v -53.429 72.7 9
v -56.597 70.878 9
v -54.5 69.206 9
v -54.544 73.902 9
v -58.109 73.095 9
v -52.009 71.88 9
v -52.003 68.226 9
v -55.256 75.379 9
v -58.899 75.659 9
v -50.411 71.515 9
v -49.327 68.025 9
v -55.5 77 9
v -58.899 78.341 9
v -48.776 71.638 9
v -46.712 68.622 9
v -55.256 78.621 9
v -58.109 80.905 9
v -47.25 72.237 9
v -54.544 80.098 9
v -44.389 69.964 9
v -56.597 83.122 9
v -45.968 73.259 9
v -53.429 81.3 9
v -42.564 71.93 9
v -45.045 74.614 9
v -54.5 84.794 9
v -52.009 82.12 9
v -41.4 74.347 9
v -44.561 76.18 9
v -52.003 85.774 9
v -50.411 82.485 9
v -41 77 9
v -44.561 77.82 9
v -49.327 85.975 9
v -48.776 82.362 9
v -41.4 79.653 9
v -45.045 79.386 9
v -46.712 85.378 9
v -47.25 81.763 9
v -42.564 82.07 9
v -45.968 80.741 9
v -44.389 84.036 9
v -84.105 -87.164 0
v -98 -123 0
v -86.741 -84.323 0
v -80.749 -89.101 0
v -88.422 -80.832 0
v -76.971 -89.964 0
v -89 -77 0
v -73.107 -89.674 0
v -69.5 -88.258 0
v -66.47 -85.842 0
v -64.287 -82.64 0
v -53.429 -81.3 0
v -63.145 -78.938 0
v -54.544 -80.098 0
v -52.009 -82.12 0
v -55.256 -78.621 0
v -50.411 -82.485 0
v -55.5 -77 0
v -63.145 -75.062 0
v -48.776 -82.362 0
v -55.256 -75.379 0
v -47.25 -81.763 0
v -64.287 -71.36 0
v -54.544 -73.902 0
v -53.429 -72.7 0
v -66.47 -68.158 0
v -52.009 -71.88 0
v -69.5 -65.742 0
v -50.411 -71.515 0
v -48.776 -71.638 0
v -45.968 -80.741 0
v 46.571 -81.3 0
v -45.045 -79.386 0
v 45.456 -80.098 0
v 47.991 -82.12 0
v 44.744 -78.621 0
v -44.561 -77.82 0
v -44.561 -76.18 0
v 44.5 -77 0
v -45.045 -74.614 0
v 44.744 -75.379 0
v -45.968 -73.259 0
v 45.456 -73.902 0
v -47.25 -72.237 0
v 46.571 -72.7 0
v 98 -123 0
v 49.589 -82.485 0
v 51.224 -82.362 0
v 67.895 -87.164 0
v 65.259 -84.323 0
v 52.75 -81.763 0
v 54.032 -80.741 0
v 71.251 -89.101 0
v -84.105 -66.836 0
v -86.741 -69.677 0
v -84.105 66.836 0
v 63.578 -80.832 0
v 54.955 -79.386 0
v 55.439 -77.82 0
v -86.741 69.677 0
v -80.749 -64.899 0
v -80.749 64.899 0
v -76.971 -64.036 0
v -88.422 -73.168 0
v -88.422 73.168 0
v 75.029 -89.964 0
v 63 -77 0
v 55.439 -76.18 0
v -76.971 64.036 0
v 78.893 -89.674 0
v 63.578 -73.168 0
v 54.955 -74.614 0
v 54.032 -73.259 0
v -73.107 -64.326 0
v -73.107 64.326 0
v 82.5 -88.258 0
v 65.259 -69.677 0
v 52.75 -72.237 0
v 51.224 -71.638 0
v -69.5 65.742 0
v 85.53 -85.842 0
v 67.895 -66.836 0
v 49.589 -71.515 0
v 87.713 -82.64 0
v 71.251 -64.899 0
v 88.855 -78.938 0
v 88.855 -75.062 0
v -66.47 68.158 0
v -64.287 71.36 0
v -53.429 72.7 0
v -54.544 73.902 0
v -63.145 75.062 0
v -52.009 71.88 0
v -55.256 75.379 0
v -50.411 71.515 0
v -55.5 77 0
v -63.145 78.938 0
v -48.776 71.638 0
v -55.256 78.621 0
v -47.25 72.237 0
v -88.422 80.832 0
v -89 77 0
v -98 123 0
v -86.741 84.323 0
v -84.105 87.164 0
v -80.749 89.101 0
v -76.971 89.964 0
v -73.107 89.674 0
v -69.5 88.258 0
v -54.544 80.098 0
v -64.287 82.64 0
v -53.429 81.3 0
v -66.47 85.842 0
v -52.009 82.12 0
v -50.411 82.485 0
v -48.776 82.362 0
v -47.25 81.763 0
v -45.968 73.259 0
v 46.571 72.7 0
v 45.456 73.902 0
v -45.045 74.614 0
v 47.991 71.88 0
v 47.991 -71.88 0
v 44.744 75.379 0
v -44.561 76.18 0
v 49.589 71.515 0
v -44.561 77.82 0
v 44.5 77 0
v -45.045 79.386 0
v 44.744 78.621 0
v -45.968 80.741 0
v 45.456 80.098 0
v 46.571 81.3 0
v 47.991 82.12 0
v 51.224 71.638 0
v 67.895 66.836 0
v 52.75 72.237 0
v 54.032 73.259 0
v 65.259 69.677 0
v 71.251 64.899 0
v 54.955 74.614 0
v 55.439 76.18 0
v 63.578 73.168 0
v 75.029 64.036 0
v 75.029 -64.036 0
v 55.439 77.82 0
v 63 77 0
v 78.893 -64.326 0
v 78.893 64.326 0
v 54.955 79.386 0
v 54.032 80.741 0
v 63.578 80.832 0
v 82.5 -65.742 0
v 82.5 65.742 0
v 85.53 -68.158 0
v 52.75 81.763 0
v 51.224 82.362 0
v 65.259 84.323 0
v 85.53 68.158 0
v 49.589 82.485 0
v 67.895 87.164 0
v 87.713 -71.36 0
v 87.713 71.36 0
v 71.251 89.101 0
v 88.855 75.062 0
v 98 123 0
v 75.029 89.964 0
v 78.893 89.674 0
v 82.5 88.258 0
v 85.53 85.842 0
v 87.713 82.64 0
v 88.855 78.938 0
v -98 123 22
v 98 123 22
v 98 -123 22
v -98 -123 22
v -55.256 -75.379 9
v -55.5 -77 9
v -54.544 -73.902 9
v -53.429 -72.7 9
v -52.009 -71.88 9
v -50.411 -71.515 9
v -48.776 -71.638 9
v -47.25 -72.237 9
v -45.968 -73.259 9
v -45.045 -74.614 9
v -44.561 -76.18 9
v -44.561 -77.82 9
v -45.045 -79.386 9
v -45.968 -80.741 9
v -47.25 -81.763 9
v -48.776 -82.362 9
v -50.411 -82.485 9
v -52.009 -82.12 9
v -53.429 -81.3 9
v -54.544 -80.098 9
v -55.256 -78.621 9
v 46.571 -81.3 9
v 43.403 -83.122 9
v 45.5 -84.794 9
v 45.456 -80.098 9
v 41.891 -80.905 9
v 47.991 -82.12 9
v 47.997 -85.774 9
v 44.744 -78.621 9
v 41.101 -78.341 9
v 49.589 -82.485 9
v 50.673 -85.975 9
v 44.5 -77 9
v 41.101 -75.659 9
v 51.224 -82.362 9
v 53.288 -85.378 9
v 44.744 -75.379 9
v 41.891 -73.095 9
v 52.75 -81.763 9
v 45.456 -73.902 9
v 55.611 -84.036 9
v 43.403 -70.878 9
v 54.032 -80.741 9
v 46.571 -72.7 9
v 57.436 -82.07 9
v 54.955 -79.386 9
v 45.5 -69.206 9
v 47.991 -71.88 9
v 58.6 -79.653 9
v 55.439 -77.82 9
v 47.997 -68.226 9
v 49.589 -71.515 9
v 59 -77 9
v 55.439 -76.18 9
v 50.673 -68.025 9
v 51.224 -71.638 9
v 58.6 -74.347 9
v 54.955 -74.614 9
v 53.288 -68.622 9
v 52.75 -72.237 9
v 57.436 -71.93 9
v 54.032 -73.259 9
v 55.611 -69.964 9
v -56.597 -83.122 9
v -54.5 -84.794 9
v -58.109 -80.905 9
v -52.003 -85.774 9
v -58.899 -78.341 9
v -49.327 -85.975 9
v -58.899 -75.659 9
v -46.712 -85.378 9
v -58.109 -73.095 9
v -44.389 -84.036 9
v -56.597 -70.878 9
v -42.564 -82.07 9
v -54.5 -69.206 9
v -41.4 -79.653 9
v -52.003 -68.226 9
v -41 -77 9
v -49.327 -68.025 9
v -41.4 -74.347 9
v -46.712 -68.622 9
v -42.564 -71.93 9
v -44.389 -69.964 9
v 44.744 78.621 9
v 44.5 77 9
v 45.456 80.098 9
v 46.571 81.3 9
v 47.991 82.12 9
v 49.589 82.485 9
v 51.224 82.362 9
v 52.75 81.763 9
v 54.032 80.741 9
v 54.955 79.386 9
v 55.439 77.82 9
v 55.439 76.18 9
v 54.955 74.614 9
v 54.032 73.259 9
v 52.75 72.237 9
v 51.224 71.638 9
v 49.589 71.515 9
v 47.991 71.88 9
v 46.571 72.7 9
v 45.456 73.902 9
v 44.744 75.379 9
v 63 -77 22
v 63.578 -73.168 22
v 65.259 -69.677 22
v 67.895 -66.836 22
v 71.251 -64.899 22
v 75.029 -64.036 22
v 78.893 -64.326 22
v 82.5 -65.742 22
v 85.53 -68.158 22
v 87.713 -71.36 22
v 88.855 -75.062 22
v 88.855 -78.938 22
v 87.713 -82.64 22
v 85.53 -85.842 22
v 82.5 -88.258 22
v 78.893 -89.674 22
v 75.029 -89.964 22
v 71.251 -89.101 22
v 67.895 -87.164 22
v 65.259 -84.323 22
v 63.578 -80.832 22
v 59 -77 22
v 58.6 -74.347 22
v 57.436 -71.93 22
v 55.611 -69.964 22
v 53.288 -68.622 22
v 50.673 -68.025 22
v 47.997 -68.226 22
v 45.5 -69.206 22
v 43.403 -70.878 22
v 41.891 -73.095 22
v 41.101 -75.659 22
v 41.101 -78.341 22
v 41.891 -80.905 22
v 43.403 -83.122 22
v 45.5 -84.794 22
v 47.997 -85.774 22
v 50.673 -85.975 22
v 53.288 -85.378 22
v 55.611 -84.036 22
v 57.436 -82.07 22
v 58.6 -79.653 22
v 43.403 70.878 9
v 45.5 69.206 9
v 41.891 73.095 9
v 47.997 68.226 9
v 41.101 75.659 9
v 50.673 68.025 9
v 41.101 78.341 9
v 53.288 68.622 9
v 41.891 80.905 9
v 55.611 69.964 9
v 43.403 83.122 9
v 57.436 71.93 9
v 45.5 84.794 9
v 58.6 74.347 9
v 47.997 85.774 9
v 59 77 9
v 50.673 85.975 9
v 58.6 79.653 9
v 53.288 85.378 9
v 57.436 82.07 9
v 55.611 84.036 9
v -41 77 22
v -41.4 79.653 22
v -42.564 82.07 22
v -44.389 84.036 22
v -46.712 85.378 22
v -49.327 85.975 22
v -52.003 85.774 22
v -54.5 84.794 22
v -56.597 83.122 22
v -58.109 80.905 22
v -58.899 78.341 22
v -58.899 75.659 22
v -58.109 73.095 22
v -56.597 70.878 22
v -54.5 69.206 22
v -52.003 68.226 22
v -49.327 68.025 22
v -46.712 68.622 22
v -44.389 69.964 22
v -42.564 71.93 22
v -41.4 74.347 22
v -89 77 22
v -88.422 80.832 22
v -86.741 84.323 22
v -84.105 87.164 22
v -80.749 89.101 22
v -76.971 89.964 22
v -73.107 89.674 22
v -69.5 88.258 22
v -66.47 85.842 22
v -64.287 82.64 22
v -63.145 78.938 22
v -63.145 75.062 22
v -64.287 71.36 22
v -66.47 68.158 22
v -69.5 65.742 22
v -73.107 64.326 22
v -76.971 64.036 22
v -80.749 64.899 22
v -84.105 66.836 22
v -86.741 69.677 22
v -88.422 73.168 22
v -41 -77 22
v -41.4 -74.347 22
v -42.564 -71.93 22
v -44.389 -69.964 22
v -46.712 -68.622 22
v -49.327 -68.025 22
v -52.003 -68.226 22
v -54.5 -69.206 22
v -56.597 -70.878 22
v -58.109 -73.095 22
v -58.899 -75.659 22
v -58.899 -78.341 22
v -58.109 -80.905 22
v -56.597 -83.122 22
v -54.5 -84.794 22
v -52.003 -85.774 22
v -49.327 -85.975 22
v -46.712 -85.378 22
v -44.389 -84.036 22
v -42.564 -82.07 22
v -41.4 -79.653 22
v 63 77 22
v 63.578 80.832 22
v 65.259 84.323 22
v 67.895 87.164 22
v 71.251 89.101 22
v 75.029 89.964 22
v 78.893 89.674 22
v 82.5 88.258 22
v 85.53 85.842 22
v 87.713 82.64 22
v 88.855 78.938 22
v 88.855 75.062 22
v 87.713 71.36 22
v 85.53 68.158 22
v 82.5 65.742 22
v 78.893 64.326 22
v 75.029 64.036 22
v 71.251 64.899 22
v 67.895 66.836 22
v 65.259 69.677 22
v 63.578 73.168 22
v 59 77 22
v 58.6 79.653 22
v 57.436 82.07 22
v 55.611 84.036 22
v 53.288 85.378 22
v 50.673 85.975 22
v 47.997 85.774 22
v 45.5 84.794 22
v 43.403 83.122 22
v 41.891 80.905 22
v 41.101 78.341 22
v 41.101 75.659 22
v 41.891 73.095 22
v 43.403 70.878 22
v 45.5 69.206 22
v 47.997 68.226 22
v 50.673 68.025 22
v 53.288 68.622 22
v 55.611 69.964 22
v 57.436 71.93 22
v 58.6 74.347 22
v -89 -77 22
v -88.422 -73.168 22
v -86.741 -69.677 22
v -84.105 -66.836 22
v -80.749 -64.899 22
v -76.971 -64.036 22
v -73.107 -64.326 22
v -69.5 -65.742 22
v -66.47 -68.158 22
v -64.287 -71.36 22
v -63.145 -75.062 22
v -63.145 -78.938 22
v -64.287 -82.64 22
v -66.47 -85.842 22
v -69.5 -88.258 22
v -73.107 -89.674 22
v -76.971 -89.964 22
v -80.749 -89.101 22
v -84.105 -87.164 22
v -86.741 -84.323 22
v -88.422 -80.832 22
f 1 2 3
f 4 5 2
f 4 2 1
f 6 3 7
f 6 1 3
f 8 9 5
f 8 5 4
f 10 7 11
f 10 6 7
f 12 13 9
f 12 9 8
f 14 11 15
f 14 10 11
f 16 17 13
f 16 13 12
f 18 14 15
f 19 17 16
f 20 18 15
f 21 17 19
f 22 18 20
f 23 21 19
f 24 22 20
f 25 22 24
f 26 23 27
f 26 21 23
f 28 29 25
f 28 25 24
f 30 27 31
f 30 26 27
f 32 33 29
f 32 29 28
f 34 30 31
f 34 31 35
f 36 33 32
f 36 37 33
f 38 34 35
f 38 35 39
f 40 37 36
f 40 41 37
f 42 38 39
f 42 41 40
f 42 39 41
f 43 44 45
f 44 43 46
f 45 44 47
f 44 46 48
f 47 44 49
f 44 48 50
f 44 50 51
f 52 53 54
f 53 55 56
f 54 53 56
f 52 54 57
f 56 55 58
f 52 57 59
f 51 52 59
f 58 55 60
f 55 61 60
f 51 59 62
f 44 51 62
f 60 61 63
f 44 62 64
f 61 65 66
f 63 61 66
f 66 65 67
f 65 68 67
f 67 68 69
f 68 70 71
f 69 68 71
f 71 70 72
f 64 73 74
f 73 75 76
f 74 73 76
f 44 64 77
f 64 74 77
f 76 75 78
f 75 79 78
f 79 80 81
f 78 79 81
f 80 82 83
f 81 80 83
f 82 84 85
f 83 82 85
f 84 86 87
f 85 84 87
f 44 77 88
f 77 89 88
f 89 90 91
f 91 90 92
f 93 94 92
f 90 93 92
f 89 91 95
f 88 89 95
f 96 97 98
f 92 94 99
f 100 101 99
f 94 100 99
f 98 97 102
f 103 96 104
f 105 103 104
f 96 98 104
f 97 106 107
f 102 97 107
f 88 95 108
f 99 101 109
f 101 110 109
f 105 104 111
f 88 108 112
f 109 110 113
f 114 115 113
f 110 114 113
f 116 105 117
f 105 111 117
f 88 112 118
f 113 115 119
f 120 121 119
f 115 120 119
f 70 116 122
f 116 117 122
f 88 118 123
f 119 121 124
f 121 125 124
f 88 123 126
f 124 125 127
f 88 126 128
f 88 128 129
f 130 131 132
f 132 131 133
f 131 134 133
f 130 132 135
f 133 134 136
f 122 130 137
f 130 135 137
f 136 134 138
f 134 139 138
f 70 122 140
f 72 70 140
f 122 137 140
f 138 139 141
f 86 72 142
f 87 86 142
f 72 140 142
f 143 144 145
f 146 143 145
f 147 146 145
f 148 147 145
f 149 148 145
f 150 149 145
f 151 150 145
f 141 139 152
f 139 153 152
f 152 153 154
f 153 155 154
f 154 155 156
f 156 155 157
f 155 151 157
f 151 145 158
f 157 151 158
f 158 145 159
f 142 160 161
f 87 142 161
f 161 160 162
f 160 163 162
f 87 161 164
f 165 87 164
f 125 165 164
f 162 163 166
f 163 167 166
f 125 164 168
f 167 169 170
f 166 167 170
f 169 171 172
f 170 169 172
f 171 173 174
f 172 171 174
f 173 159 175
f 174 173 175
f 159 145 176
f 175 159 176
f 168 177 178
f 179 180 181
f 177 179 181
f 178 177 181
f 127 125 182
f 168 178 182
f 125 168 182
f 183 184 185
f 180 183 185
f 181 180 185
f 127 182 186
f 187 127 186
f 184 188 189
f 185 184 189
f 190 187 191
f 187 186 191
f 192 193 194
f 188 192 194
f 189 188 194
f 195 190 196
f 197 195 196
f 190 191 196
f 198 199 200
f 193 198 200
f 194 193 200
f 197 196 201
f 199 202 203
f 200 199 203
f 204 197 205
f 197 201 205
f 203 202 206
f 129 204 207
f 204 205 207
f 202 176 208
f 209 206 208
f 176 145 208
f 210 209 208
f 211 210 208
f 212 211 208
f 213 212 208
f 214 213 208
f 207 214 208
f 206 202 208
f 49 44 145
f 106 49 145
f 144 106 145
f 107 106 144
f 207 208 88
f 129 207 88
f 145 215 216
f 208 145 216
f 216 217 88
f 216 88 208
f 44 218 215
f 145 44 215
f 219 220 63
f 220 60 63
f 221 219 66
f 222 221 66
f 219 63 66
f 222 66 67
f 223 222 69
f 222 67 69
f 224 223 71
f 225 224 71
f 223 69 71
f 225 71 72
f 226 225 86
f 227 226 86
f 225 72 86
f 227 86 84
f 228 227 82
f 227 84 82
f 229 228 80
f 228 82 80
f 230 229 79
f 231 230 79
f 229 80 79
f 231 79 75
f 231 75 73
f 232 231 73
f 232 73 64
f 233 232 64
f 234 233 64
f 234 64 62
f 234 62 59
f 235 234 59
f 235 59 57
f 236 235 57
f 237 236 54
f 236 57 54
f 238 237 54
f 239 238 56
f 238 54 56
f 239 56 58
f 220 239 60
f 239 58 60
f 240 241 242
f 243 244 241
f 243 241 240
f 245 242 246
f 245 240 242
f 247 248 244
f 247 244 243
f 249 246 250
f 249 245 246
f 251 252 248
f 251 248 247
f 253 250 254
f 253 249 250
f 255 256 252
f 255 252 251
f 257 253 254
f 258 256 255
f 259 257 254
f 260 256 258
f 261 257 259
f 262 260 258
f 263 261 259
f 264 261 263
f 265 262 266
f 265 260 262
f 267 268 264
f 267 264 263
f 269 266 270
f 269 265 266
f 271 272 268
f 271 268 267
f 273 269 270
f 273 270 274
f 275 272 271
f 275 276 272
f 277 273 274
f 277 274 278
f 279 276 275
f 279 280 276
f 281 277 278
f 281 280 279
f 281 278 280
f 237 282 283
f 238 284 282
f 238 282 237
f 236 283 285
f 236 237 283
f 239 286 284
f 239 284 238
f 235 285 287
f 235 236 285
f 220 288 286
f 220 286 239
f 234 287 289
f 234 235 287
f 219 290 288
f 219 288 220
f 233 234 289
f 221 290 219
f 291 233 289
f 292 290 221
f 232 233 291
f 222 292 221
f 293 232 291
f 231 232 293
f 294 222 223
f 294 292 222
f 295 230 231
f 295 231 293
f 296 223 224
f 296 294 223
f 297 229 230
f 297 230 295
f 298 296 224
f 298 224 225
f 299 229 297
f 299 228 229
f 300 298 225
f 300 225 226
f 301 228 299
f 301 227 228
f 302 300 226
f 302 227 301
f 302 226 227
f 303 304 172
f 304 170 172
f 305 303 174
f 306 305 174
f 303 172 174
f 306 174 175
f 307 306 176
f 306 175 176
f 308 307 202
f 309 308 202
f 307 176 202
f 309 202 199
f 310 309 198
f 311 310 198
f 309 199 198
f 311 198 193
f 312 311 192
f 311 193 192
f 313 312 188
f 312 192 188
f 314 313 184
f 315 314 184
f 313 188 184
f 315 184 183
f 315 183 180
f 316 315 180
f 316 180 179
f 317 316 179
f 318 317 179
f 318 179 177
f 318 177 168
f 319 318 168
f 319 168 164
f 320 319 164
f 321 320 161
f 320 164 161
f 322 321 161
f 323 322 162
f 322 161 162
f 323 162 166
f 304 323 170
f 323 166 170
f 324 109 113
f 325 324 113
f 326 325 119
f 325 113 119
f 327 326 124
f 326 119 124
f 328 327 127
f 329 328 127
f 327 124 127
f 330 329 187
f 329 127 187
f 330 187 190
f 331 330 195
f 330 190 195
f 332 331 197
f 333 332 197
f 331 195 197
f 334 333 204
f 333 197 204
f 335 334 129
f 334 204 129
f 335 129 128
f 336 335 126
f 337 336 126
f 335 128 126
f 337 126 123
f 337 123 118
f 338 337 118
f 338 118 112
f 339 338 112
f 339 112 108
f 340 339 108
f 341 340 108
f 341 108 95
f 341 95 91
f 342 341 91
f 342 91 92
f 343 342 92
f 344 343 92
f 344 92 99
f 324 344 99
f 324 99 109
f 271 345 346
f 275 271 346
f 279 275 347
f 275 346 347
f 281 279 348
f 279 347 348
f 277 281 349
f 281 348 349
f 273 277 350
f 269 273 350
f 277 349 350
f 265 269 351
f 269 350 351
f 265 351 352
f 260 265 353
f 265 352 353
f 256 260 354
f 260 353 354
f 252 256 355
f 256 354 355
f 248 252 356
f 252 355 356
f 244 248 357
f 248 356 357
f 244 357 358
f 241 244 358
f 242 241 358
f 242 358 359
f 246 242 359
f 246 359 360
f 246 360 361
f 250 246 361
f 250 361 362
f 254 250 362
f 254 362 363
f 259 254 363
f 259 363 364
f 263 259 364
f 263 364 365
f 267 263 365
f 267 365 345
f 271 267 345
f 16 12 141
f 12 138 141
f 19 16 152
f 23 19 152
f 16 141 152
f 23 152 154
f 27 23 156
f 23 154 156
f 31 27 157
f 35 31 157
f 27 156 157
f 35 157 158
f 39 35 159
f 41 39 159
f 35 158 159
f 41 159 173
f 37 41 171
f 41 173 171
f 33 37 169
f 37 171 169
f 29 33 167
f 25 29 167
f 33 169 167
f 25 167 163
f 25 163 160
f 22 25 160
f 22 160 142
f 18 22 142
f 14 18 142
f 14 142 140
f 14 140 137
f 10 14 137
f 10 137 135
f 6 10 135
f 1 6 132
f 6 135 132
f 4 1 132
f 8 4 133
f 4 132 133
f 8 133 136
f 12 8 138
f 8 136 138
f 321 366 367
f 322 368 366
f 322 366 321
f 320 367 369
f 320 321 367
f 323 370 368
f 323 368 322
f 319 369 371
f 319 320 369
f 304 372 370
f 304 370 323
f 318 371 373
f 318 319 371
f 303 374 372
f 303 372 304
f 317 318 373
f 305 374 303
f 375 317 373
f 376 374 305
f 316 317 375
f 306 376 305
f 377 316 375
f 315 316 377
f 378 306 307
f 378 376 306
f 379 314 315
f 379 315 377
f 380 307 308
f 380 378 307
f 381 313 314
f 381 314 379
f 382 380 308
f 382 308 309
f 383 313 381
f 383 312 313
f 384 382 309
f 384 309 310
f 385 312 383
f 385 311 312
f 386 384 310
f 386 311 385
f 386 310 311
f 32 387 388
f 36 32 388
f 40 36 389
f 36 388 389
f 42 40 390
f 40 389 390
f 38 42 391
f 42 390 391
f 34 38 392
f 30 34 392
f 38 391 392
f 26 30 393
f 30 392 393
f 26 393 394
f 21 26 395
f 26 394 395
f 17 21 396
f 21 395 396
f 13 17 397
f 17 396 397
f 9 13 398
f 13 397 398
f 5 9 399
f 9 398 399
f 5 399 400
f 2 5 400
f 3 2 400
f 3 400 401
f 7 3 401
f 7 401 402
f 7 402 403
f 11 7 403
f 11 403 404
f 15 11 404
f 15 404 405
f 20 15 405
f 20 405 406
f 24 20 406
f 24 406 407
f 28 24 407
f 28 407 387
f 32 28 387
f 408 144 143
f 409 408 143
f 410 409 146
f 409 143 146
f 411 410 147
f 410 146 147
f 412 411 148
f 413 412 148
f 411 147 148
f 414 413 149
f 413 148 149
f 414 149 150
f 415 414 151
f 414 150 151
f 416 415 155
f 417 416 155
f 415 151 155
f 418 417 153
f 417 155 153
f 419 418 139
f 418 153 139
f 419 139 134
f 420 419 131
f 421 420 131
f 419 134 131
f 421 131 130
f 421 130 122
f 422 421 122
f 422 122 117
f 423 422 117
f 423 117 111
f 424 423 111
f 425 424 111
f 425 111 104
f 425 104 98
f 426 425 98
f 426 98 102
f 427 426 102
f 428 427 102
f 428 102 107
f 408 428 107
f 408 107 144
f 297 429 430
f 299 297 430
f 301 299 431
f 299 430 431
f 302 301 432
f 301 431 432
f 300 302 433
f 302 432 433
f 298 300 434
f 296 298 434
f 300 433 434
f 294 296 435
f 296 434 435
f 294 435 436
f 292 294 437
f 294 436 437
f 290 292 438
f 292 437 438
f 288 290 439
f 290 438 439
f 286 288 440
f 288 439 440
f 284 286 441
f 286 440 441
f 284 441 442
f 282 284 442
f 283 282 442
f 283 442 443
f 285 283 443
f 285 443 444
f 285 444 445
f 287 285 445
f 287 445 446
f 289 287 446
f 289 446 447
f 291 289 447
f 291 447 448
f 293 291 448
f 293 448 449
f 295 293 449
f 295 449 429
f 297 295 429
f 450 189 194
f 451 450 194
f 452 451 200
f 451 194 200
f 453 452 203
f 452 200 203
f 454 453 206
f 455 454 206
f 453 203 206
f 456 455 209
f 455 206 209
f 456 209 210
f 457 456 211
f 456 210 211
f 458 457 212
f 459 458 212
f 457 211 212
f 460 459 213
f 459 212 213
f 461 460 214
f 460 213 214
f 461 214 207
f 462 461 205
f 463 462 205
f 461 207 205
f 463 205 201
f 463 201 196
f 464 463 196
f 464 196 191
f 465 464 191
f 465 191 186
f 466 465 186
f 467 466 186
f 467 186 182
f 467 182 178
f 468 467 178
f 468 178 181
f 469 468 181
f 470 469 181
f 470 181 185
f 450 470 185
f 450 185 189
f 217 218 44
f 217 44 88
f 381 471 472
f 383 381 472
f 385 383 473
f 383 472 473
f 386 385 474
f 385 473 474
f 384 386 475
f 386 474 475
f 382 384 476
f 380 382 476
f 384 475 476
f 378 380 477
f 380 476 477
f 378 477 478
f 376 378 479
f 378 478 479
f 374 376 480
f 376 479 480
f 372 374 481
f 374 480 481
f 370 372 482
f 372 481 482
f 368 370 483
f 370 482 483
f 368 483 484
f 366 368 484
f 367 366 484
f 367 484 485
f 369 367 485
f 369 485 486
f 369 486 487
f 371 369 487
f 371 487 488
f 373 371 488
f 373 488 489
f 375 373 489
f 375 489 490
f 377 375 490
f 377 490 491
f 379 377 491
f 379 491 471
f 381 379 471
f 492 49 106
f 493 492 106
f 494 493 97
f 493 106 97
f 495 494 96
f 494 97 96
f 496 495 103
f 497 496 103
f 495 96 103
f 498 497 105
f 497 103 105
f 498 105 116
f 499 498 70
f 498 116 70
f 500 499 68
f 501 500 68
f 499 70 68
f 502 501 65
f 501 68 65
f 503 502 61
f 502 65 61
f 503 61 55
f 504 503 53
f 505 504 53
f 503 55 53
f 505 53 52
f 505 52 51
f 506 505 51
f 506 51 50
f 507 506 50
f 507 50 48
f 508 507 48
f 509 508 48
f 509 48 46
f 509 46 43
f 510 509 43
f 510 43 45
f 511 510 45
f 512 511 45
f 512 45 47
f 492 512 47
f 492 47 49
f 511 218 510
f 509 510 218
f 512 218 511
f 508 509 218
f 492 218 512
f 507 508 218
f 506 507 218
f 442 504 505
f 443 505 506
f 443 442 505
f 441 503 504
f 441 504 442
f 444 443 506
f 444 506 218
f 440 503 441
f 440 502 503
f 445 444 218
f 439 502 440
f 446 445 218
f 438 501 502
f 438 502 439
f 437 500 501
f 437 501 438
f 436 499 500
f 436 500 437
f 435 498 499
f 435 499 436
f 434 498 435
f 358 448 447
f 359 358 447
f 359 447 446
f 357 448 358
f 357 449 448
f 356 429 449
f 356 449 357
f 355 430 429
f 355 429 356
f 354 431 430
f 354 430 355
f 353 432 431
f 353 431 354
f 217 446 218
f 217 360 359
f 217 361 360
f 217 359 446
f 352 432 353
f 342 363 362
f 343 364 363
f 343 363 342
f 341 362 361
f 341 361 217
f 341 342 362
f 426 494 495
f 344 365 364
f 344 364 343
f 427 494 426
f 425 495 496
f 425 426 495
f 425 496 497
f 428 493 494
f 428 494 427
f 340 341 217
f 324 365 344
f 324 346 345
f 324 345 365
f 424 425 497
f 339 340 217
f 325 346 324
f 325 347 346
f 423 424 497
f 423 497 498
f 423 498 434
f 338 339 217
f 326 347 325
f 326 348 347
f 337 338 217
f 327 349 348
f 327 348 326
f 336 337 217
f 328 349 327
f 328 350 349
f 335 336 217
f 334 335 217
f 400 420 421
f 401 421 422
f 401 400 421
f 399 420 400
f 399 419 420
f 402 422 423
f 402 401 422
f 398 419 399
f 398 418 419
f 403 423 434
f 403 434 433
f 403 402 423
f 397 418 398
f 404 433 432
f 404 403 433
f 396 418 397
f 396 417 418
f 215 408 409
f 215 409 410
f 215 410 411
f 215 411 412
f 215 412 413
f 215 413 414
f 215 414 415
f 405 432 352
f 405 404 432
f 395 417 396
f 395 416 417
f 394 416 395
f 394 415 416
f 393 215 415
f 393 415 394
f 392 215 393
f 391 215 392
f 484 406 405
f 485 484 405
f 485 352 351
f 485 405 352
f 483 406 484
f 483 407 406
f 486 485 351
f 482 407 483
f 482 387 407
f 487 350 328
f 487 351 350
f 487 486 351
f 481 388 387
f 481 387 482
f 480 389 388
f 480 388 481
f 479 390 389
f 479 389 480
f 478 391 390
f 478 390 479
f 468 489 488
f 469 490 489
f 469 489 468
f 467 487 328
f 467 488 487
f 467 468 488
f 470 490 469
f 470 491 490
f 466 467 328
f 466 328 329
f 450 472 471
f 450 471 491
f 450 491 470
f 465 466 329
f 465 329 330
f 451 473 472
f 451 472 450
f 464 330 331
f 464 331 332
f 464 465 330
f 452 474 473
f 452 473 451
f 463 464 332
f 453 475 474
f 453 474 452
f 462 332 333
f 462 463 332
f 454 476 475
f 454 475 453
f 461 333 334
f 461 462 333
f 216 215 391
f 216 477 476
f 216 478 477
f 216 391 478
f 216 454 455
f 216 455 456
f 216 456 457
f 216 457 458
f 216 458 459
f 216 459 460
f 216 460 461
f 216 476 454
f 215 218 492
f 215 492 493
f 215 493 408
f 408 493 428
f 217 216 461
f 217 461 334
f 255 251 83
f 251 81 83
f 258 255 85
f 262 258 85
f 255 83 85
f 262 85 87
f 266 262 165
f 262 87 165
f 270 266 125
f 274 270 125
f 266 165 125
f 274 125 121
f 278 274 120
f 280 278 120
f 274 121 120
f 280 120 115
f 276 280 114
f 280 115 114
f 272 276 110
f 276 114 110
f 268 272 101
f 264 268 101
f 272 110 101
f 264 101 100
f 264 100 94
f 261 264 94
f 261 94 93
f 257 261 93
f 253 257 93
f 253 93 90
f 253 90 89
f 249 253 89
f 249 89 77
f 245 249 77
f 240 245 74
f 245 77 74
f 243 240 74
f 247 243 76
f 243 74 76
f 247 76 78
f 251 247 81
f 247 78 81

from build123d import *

# Parameters (mm, degrees)
SKETCH_1_W                   = 196
SKETCH_1_H                   = 246
EXTRUDE_1_DEPTH              = 22
HOLE_WIZARD_M101_D           = 11
HOLE_WIZARD_M101_CBORE_D     = 18
HOLE_WIZARD_M101_CBORE_DEPTH = 13
HOLE_WIZARD_M221_D           = 26


with BuildPart() as part:
    # Эскиз1 → Бобышка-Вытянуть1 (new body)
    with BuildSketch(Plane.XY.offset(22)):
        Rectangle(SKETCH_1_W, SKETCH_1_H)
    extrude(amount=-EXTRUDE_1_DEPTH)

    # Цековка для  болта с шестигранной головкой M101 (through all)
    with Locations(Plane.XY.offset(22)):
        with Locations((50, 77), (50, -77), (-50, 77), (-50, -77)):
            CounterBoreHole(HOLE_WIZARD_M101_D / 2, HOLE_WIZARD_M101_CBORE_D / 2, HOLE_WIZARD_M101_CBORE_DEPTH)

    # Отверстие с зазором M221 (through all)
    with Locations(Plane.XY.offset(22)):
        with Locations((76, 77), (76, -77), (-76, -77), (-76, 77)):
            Hole(HOLE_WIZARD_M221_D / 2)


solid = part.part
